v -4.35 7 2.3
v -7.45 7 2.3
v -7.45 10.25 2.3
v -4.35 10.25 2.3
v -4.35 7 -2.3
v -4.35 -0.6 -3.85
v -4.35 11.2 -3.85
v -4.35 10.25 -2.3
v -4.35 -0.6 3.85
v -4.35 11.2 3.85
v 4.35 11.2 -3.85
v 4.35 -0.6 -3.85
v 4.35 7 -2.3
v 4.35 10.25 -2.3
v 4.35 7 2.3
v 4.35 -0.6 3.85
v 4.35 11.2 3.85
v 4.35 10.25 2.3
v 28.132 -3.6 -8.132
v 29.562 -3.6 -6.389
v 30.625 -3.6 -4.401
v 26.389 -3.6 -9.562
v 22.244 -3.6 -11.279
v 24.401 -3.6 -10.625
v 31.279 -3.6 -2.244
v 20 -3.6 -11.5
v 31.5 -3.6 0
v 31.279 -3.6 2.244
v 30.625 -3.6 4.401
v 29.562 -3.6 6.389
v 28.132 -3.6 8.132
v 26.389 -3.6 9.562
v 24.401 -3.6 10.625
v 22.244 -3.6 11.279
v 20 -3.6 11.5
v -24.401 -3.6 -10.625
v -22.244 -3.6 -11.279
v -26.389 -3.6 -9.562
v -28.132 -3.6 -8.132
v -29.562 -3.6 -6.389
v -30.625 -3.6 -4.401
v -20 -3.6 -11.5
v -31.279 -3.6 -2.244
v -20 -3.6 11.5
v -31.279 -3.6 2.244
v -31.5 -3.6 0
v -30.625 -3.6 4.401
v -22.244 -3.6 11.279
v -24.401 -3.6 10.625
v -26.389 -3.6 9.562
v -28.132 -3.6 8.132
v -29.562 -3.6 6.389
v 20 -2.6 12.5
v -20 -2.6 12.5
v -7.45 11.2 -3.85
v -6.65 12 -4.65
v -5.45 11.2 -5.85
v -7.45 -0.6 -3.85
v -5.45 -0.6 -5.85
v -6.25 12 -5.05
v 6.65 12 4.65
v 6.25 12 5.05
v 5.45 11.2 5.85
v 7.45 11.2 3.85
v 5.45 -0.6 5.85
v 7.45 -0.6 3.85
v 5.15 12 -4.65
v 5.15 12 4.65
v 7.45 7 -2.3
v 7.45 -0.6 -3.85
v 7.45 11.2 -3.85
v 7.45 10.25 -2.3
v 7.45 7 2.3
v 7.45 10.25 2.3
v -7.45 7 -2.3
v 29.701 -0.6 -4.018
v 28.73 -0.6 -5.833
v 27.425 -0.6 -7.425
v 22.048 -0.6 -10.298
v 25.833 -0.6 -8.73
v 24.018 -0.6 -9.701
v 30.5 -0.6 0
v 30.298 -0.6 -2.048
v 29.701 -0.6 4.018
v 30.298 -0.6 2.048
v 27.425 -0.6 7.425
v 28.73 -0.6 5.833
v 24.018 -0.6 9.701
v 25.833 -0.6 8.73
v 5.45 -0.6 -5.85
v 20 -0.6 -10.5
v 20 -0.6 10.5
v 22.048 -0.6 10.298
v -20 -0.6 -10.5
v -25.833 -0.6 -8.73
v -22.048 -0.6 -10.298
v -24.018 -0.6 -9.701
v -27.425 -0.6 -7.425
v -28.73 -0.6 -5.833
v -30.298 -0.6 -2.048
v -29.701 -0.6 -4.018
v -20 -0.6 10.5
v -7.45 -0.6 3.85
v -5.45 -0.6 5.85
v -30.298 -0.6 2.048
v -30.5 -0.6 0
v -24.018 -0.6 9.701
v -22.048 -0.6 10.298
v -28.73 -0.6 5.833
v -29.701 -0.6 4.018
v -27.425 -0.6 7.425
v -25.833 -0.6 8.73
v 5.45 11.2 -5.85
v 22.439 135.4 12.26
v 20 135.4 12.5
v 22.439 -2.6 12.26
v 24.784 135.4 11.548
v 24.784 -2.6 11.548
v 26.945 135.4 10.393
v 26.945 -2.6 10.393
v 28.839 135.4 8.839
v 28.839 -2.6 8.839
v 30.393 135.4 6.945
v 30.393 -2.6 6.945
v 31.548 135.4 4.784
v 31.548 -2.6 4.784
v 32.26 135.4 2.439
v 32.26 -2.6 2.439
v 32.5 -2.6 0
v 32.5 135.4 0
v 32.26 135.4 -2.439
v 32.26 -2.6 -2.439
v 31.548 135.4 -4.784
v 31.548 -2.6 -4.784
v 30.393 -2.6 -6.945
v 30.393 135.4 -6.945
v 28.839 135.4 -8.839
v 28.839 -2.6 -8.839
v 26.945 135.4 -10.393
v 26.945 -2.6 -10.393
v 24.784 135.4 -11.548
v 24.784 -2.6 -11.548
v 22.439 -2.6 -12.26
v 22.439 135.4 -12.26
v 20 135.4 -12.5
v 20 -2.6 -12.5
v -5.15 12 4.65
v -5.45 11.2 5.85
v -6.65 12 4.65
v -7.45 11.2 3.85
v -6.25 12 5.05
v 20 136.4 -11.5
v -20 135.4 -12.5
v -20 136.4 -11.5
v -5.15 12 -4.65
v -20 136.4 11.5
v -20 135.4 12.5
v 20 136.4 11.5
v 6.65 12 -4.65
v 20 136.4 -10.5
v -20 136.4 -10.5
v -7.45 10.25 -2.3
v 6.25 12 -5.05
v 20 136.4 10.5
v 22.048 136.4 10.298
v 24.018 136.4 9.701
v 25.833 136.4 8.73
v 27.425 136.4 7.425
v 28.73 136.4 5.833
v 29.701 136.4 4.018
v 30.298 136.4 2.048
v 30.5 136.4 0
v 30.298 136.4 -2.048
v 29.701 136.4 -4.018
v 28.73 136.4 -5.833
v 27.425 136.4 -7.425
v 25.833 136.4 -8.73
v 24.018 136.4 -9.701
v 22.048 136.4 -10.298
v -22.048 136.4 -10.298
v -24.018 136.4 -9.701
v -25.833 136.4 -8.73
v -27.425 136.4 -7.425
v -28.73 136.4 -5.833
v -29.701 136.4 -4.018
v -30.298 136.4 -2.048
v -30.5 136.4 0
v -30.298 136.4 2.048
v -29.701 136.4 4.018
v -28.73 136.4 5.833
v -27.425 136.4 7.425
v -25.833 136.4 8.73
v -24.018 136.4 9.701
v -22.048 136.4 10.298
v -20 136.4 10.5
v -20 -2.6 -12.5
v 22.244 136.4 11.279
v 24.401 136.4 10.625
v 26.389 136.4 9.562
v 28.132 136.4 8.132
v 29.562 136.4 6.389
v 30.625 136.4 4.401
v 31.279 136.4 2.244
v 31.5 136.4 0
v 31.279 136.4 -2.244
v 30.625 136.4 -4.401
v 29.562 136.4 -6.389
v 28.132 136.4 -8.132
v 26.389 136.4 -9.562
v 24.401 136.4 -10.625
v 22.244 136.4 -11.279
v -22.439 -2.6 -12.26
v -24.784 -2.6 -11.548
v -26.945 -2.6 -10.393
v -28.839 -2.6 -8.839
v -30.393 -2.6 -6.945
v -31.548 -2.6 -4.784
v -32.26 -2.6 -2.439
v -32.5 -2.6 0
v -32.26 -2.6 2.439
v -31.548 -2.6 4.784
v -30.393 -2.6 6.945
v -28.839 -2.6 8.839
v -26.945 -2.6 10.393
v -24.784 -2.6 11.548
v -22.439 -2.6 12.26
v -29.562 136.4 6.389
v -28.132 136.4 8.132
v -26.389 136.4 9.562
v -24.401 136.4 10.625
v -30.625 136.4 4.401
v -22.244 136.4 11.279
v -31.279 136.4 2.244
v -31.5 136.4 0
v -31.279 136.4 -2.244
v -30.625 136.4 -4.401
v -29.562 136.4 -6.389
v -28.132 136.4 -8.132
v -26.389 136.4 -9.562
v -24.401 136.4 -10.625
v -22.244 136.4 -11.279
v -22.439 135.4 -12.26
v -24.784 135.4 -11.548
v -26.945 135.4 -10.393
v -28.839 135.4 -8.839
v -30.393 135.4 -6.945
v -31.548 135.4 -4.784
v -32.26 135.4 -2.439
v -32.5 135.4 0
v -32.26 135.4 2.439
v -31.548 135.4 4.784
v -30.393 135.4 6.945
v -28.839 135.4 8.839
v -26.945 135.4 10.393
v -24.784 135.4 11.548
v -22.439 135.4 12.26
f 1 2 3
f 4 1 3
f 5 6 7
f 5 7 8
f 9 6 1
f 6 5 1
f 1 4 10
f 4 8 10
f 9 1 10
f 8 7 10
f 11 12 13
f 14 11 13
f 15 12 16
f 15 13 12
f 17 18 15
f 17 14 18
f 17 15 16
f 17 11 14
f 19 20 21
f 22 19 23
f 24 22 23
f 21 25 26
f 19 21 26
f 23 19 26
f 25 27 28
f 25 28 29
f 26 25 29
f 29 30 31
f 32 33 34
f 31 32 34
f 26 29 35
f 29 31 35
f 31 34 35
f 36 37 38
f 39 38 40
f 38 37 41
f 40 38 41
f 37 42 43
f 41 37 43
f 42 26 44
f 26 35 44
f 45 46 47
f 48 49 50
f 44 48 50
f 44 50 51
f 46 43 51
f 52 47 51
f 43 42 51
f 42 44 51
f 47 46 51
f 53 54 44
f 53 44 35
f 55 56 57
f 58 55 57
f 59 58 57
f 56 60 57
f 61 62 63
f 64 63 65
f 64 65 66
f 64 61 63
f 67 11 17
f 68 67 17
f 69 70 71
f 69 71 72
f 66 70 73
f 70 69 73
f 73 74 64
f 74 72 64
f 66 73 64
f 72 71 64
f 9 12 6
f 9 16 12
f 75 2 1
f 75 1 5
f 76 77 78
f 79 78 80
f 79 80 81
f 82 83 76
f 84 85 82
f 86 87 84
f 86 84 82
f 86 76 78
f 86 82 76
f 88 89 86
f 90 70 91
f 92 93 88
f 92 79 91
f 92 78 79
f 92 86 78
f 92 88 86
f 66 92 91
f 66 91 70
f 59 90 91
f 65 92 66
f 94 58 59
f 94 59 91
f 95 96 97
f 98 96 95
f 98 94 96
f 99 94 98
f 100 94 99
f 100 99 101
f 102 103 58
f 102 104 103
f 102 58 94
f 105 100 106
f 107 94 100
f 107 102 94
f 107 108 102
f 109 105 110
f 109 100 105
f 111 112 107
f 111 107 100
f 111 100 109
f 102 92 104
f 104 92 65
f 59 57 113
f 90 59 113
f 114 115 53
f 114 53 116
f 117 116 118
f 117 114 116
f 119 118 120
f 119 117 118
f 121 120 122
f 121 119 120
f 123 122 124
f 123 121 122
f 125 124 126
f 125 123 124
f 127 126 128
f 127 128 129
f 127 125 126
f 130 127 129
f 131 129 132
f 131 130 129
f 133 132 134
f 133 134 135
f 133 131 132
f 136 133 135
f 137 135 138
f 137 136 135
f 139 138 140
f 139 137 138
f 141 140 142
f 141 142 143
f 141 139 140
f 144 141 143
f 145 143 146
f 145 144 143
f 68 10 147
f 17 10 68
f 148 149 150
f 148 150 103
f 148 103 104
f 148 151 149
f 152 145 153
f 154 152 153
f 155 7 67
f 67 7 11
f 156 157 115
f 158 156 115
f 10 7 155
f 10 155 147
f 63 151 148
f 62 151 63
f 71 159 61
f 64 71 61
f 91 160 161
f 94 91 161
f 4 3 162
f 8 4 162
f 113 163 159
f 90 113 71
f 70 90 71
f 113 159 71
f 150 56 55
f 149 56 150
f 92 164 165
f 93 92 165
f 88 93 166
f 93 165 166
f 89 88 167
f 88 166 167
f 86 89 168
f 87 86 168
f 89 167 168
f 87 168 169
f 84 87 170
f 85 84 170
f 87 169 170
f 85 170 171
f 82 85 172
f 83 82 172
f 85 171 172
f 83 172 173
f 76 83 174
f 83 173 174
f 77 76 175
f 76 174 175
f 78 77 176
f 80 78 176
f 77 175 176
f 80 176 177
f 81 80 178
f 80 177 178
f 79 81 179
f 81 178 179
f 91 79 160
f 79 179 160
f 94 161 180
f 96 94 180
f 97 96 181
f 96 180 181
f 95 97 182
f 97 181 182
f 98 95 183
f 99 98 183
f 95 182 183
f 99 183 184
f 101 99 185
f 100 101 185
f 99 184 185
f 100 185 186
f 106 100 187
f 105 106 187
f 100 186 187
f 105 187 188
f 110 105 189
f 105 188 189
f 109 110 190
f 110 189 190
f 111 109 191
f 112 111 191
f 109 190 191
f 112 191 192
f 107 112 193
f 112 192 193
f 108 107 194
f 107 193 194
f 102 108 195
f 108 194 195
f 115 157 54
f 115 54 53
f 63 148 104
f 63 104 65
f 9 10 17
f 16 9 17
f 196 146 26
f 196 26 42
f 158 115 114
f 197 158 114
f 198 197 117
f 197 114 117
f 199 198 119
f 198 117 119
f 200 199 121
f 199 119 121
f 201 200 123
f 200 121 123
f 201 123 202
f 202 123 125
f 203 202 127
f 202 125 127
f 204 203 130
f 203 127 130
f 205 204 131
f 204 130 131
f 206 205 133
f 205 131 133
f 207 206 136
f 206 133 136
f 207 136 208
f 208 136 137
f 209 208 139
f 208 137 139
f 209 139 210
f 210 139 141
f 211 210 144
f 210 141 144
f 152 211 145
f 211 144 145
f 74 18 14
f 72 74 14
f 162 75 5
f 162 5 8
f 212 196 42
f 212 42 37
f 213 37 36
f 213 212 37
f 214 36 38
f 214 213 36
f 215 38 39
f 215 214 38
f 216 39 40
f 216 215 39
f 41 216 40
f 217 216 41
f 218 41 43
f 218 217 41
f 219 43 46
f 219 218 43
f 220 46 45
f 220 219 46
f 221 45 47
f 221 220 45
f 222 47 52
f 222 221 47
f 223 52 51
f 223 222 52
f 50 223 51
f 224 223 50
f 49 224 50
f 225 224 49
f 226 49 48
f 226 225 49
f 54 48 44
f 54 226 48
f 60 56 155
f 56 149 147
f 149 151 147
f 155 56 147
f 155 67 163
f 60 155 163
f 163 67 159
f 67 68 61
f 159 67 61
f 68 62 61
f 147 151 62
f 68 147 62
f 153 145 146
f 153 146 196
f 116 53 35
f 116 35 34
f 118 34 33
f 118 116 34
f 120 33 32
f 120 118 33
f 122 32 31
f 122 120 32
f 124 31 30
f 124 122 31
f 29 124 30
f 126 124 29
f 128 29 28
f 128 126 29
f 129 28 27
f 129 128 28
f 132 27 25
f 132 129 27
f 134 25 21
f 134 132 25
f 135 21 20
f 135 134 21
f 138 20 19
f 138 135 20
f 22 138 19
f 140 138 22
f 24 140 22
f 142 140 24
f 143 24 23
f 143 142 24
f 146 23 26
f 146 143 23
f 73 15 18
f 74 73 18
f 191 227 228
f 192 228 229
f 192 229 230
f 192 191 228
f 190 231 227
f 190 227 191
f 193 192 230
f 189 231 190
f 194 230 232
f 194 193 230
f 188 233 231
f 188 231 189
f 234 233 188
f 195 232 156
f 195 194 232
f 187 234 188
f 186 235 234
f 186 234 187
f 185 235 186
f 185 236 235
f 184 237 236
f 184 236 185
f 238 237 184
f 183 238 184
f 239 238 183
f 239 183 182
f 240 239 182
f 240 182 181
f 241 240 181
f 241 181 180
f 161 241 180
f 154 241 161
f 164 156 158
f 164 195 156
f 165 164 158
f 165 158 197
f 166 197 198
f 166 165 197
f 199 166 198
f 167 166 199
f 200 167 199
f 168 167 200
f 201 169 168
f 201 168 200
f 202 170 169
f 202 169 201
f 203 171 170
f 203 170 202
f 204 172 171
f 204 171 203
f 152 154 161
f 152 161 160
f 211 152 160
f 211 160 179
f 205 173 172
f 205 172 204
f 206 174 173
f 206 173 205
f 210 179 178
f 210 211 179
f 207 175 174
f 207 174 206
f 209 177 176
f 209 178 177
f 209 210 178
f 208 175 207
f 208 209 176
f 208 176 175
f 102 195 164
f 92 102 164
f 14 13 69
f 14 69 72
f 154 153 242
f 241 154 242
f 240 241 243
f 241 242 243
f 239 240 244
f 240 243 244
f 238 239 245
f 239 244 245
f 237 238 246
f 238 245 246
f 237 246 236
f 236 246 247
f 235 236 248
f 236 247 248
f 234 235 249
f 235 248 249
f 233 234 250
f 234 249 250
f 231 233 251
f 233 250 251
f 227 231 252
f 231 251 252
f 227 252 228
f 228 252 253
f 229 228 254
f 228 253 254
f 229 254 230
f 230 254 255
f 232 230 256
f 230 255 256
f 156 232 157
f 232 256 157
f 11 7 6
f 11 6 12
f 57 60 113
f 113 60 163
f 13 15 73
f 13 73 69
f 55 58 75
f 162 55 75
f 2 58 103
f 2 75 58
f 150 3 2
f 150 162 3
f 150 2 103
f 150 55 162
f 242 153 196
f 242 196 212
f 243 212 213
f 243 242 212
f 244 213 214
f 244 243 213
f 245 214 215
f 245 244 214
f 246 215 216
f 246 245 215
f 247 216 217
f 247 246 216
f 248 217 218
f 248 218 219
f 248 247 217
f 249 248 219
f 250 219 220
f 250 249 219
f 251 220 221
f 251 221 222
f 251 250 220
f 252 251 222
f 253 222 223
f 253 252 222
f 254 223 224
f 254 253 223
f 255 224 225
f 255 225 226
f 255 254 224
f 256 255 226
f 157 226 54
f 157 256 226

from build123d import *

# Parameters (mm, degrees)
SKETCH2_W               = 14.9
SKETCH2_H               = 11.7
SKETCH2_W_2             = 8.7
SKETCH2_H_2             = 7.7
BOSS_EXTRUDE1_DEPTH     = 12.6
CUT_EXTRUDE1_DEPTH      = 16.288067242
CUT_EXTRUDE1_DEPTH_BACK = 16.288067242
SKETCH4_W               = 4.6
SKETCH4_H               = 3.25
BOSS_EXTRUDE2_DEPTH     = 3
BOSS_EXTRUDE3_START     = 137
BOSS_EXTRUDE3_DEPTH     = 137
CHAMFER1_SIZE           = 1
CHAMFER2_SIZE           = 0.8
CHAMFER3_SIZE           = 2


with BuildPart() as part:
    # Sketch2 → Boss-Extrude1 (new body)
    with BuildSketch(Plane.XZ.offset(-12)):
        Rectangle(SKETCH2_W, SKETCH2_H)
        Rectangle(SKETCH2_W_2, SKETCH2_H_2, mode=Mode.SUBTRACT)
    extrude(amount=BOSS_EXTRUDE1_DEPTH)

    # Sketch4 → Cut-Extrude1 (cut, two sides: drawn at the far end of the back side and taken through both)
    with BuildSketch(Plane(origin=(0, 0, 0), x_dir=(0, 0, -1), z_dir=(1, 0, 0)).offset(-CUT_EXTRUDE1_DEPTH_BACK)):
        with Locations((0, 8.625)):
            Rectangle(SKETCH4_W, SKETCH4_H)
    extrude(amount=CUT_EXTRUDE1_DEPTH + CUT_EXTRUDE1_DEPTH_BACK, mode=Mode.SUBTRACT)

    # Sketch5 → Boss-Extrude2 (add)
    with BuildSketch(Plane.XZ.offset(0.6)):
        with BuildLine():
            Line((-20, 12.5), (20, 12.5))
            ThreePointArc((20, 12.5), (32.5, 0), (20, -12.5))
            Line((20, -12.5), (-20, -12.5))
            ThreePointArc((-20, -12.5), (-32.5, 0), (-20, 12.5))
        make_face()
    extrude(amount=BOSS_EXTRUDE2_DEPTH)

    # Sketch7 → Boss-Extrude3 (add)
    with BuildSketch(Plane(origin=(0, -0.6, 0), x_dir=(1, 0, 0), z_dir=(0, 1, 0)).offset(BOSS_EXTRUDE3_START)):
        with BuildLine():
            Line((-20, -12.5), (20, -12.5))
            ThreePointArc((20, -12.5), (32.5, 0), (20, 12.5))
            Line((20, 12.5), (-20, 12.5))
            ThreePointArc((-20, 12.5), (-32.5, 0), (-20, -12.5))
        make_face()
        with BuildLine():
            Line((-20, -10.5), (20, -10.5))
            ThreePointArc((20, -10.5), (30.5, 0), (20, 10.5))
            Line((20, 10.5), (-20, 10.5))
            ThreePointArc((-20, 10.5), (-30.5, 0), (-20, -10.5))
        make_face(mode=Mode.SUBTRACT)
    extrude(amount=-BOSS_EXTRUDE3_DEPTH)

    # Chamfer1
    chamfer1_edges = [part.edges().sort_by_distance(p)[0] for p in [
        (-32.5, -3.6, 0),
        (0, -3.6, -12.5),
        (32.5, -3.6, 0),
        (0, -3.6, 12.5),
        (-32.5, 136.4, 0),
        (0, 136.4, 12.5),
        (32.5, 136.4, 0),
        (0, 136.4, -12.5),
    ]]
    chamfer(chamfer1_edges, length=CHAMFER1_SIZE)

    # Chamfer2
    chamfer2_edges = [part.edges().sort_by_distance(p)[0] for p in [
        (0, 12, -3.85),
        (4.35, 12, 0),
        (0, 12, 3.85),
        (-4.35, 12, 0),
        (0, 12, -5.85),
        (-7.45, 12, 0),
        (0, 12, 5.85),
        (7.45, 12, 0),
    ]]
    chamfer(chamfer2_edges, length=CHAMFER2_SIZE)

    # Chamfer3
    # the kernel refuses this chamfer: 2 mm, written as the material it takes off along each edge
    with BuildSketch(Plane(origin=(-7.45, 16.343365976, 5.85), x_dir=(-0.027495876610586053, 0, -0.9996219169112968), z_dir=(0, -1, 0)), Plane(origin=(7.45, 16.343365976, 5.85), x_dir=(-0.9996219169112968, 0, 0.027495876610586487), z_dir=(0, -1, 0))) as chamfer3_piece_1:
        Polygon((CHAMFER3_SIZE * 0.999621916911, CHAMFER3_SIZE * 0.0274958766106), (-CHAMFER3_SIZE * 0.0274958766106, CHAMFER3_SIZE * 0.999621916911), (0, 0), align=None)
    extrude(amount=16.943365976, mode=Mode.SUBTRACT)
    with BuildSketch(Plane(origin=(-7.45, 16.343365976, -5.85), x_dir=(-0.027495876610586924, 0, 0.9996219169112968), z_dir=(0, -1, 0)), Plane(origin=(7.45, 16.343365976, -5.85), x_dir=(-0.9996219169112968, 0, -0.027495876610586487), z_dir=(0, -1, 0))) as chamfer3_piece_2:
        Polygon((CHAMFER3_SIZE * 0.999621916911, -CHAMFER3_SIZE * 0.0274958766106), (-CHAMFER3_SIZE * 0.0274958766106, -CHAMFER3_SIZE * 0.999621916911), (0, 0), align=None)
    extrude(amount=16.943365976, mode=Mode.SUBTRACT)


solid = part.part
